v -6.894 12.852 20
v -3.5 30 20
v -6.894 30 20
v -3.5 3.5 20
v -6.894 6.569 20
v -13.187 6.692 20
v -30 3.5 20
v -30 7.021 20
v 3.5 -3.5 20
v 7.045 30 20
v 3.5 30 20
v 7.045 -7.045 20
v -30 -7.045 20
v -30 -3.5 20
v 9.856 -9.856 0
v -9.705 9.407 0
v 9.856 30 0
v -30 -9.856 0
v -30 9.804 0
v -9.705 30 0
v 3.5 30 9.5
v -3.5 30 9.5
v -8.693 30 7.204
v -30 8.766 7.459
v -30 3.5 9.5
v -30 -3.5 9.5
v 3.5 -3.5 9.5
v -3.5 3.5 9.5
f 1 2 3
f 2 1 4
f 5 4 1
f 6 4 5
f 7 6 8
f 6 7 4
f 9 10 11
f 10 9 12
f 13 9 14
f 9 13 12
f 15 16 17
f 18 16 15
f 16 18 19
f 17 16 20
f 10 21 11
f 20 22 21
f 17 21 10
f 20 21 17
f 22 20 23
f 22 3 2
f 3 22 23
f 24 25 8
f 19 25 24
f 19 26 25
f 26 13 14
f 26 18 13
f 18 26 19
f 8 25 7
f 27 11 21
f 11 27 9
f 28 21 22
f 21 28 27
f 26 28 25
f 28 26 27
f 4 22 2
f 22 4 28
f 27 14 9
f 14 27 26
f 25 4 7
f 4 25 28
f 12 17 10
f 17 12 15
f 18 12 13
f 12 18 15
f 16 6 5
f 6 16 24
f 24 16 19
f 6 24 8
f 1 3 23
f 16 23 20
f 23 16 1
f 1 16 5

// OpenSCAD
// Straight piece for supporting the middle of cage wall

difference() {
    union() {
        translate([0,10,10]) cube( [20,40,20], center=true );    
        rotate([0,0,90]) translate([0,10,10]) cube( [20,40,20], center=true );    
    }

    // channel
    translate([0,17,15]) cube( [ 7,41,11], center=true );
    rotate([0,0,90]) translate([0,17,15]) cube( [ 7,41,11], center=true );

    // outside bezel
    translate([13.5,10,10]) rotate([0,-8,0]) cube( [10,41,30], center=true );
    rotate([0,0,-90]) translate([13.5,-10,10]) rotate([0,-8,0]) cube( [10,41,30], center=true );

    // inside bezel
     translate([-40,10,0]) rotate([8,8,0]) cube( [30,30,30], center=false );
}
